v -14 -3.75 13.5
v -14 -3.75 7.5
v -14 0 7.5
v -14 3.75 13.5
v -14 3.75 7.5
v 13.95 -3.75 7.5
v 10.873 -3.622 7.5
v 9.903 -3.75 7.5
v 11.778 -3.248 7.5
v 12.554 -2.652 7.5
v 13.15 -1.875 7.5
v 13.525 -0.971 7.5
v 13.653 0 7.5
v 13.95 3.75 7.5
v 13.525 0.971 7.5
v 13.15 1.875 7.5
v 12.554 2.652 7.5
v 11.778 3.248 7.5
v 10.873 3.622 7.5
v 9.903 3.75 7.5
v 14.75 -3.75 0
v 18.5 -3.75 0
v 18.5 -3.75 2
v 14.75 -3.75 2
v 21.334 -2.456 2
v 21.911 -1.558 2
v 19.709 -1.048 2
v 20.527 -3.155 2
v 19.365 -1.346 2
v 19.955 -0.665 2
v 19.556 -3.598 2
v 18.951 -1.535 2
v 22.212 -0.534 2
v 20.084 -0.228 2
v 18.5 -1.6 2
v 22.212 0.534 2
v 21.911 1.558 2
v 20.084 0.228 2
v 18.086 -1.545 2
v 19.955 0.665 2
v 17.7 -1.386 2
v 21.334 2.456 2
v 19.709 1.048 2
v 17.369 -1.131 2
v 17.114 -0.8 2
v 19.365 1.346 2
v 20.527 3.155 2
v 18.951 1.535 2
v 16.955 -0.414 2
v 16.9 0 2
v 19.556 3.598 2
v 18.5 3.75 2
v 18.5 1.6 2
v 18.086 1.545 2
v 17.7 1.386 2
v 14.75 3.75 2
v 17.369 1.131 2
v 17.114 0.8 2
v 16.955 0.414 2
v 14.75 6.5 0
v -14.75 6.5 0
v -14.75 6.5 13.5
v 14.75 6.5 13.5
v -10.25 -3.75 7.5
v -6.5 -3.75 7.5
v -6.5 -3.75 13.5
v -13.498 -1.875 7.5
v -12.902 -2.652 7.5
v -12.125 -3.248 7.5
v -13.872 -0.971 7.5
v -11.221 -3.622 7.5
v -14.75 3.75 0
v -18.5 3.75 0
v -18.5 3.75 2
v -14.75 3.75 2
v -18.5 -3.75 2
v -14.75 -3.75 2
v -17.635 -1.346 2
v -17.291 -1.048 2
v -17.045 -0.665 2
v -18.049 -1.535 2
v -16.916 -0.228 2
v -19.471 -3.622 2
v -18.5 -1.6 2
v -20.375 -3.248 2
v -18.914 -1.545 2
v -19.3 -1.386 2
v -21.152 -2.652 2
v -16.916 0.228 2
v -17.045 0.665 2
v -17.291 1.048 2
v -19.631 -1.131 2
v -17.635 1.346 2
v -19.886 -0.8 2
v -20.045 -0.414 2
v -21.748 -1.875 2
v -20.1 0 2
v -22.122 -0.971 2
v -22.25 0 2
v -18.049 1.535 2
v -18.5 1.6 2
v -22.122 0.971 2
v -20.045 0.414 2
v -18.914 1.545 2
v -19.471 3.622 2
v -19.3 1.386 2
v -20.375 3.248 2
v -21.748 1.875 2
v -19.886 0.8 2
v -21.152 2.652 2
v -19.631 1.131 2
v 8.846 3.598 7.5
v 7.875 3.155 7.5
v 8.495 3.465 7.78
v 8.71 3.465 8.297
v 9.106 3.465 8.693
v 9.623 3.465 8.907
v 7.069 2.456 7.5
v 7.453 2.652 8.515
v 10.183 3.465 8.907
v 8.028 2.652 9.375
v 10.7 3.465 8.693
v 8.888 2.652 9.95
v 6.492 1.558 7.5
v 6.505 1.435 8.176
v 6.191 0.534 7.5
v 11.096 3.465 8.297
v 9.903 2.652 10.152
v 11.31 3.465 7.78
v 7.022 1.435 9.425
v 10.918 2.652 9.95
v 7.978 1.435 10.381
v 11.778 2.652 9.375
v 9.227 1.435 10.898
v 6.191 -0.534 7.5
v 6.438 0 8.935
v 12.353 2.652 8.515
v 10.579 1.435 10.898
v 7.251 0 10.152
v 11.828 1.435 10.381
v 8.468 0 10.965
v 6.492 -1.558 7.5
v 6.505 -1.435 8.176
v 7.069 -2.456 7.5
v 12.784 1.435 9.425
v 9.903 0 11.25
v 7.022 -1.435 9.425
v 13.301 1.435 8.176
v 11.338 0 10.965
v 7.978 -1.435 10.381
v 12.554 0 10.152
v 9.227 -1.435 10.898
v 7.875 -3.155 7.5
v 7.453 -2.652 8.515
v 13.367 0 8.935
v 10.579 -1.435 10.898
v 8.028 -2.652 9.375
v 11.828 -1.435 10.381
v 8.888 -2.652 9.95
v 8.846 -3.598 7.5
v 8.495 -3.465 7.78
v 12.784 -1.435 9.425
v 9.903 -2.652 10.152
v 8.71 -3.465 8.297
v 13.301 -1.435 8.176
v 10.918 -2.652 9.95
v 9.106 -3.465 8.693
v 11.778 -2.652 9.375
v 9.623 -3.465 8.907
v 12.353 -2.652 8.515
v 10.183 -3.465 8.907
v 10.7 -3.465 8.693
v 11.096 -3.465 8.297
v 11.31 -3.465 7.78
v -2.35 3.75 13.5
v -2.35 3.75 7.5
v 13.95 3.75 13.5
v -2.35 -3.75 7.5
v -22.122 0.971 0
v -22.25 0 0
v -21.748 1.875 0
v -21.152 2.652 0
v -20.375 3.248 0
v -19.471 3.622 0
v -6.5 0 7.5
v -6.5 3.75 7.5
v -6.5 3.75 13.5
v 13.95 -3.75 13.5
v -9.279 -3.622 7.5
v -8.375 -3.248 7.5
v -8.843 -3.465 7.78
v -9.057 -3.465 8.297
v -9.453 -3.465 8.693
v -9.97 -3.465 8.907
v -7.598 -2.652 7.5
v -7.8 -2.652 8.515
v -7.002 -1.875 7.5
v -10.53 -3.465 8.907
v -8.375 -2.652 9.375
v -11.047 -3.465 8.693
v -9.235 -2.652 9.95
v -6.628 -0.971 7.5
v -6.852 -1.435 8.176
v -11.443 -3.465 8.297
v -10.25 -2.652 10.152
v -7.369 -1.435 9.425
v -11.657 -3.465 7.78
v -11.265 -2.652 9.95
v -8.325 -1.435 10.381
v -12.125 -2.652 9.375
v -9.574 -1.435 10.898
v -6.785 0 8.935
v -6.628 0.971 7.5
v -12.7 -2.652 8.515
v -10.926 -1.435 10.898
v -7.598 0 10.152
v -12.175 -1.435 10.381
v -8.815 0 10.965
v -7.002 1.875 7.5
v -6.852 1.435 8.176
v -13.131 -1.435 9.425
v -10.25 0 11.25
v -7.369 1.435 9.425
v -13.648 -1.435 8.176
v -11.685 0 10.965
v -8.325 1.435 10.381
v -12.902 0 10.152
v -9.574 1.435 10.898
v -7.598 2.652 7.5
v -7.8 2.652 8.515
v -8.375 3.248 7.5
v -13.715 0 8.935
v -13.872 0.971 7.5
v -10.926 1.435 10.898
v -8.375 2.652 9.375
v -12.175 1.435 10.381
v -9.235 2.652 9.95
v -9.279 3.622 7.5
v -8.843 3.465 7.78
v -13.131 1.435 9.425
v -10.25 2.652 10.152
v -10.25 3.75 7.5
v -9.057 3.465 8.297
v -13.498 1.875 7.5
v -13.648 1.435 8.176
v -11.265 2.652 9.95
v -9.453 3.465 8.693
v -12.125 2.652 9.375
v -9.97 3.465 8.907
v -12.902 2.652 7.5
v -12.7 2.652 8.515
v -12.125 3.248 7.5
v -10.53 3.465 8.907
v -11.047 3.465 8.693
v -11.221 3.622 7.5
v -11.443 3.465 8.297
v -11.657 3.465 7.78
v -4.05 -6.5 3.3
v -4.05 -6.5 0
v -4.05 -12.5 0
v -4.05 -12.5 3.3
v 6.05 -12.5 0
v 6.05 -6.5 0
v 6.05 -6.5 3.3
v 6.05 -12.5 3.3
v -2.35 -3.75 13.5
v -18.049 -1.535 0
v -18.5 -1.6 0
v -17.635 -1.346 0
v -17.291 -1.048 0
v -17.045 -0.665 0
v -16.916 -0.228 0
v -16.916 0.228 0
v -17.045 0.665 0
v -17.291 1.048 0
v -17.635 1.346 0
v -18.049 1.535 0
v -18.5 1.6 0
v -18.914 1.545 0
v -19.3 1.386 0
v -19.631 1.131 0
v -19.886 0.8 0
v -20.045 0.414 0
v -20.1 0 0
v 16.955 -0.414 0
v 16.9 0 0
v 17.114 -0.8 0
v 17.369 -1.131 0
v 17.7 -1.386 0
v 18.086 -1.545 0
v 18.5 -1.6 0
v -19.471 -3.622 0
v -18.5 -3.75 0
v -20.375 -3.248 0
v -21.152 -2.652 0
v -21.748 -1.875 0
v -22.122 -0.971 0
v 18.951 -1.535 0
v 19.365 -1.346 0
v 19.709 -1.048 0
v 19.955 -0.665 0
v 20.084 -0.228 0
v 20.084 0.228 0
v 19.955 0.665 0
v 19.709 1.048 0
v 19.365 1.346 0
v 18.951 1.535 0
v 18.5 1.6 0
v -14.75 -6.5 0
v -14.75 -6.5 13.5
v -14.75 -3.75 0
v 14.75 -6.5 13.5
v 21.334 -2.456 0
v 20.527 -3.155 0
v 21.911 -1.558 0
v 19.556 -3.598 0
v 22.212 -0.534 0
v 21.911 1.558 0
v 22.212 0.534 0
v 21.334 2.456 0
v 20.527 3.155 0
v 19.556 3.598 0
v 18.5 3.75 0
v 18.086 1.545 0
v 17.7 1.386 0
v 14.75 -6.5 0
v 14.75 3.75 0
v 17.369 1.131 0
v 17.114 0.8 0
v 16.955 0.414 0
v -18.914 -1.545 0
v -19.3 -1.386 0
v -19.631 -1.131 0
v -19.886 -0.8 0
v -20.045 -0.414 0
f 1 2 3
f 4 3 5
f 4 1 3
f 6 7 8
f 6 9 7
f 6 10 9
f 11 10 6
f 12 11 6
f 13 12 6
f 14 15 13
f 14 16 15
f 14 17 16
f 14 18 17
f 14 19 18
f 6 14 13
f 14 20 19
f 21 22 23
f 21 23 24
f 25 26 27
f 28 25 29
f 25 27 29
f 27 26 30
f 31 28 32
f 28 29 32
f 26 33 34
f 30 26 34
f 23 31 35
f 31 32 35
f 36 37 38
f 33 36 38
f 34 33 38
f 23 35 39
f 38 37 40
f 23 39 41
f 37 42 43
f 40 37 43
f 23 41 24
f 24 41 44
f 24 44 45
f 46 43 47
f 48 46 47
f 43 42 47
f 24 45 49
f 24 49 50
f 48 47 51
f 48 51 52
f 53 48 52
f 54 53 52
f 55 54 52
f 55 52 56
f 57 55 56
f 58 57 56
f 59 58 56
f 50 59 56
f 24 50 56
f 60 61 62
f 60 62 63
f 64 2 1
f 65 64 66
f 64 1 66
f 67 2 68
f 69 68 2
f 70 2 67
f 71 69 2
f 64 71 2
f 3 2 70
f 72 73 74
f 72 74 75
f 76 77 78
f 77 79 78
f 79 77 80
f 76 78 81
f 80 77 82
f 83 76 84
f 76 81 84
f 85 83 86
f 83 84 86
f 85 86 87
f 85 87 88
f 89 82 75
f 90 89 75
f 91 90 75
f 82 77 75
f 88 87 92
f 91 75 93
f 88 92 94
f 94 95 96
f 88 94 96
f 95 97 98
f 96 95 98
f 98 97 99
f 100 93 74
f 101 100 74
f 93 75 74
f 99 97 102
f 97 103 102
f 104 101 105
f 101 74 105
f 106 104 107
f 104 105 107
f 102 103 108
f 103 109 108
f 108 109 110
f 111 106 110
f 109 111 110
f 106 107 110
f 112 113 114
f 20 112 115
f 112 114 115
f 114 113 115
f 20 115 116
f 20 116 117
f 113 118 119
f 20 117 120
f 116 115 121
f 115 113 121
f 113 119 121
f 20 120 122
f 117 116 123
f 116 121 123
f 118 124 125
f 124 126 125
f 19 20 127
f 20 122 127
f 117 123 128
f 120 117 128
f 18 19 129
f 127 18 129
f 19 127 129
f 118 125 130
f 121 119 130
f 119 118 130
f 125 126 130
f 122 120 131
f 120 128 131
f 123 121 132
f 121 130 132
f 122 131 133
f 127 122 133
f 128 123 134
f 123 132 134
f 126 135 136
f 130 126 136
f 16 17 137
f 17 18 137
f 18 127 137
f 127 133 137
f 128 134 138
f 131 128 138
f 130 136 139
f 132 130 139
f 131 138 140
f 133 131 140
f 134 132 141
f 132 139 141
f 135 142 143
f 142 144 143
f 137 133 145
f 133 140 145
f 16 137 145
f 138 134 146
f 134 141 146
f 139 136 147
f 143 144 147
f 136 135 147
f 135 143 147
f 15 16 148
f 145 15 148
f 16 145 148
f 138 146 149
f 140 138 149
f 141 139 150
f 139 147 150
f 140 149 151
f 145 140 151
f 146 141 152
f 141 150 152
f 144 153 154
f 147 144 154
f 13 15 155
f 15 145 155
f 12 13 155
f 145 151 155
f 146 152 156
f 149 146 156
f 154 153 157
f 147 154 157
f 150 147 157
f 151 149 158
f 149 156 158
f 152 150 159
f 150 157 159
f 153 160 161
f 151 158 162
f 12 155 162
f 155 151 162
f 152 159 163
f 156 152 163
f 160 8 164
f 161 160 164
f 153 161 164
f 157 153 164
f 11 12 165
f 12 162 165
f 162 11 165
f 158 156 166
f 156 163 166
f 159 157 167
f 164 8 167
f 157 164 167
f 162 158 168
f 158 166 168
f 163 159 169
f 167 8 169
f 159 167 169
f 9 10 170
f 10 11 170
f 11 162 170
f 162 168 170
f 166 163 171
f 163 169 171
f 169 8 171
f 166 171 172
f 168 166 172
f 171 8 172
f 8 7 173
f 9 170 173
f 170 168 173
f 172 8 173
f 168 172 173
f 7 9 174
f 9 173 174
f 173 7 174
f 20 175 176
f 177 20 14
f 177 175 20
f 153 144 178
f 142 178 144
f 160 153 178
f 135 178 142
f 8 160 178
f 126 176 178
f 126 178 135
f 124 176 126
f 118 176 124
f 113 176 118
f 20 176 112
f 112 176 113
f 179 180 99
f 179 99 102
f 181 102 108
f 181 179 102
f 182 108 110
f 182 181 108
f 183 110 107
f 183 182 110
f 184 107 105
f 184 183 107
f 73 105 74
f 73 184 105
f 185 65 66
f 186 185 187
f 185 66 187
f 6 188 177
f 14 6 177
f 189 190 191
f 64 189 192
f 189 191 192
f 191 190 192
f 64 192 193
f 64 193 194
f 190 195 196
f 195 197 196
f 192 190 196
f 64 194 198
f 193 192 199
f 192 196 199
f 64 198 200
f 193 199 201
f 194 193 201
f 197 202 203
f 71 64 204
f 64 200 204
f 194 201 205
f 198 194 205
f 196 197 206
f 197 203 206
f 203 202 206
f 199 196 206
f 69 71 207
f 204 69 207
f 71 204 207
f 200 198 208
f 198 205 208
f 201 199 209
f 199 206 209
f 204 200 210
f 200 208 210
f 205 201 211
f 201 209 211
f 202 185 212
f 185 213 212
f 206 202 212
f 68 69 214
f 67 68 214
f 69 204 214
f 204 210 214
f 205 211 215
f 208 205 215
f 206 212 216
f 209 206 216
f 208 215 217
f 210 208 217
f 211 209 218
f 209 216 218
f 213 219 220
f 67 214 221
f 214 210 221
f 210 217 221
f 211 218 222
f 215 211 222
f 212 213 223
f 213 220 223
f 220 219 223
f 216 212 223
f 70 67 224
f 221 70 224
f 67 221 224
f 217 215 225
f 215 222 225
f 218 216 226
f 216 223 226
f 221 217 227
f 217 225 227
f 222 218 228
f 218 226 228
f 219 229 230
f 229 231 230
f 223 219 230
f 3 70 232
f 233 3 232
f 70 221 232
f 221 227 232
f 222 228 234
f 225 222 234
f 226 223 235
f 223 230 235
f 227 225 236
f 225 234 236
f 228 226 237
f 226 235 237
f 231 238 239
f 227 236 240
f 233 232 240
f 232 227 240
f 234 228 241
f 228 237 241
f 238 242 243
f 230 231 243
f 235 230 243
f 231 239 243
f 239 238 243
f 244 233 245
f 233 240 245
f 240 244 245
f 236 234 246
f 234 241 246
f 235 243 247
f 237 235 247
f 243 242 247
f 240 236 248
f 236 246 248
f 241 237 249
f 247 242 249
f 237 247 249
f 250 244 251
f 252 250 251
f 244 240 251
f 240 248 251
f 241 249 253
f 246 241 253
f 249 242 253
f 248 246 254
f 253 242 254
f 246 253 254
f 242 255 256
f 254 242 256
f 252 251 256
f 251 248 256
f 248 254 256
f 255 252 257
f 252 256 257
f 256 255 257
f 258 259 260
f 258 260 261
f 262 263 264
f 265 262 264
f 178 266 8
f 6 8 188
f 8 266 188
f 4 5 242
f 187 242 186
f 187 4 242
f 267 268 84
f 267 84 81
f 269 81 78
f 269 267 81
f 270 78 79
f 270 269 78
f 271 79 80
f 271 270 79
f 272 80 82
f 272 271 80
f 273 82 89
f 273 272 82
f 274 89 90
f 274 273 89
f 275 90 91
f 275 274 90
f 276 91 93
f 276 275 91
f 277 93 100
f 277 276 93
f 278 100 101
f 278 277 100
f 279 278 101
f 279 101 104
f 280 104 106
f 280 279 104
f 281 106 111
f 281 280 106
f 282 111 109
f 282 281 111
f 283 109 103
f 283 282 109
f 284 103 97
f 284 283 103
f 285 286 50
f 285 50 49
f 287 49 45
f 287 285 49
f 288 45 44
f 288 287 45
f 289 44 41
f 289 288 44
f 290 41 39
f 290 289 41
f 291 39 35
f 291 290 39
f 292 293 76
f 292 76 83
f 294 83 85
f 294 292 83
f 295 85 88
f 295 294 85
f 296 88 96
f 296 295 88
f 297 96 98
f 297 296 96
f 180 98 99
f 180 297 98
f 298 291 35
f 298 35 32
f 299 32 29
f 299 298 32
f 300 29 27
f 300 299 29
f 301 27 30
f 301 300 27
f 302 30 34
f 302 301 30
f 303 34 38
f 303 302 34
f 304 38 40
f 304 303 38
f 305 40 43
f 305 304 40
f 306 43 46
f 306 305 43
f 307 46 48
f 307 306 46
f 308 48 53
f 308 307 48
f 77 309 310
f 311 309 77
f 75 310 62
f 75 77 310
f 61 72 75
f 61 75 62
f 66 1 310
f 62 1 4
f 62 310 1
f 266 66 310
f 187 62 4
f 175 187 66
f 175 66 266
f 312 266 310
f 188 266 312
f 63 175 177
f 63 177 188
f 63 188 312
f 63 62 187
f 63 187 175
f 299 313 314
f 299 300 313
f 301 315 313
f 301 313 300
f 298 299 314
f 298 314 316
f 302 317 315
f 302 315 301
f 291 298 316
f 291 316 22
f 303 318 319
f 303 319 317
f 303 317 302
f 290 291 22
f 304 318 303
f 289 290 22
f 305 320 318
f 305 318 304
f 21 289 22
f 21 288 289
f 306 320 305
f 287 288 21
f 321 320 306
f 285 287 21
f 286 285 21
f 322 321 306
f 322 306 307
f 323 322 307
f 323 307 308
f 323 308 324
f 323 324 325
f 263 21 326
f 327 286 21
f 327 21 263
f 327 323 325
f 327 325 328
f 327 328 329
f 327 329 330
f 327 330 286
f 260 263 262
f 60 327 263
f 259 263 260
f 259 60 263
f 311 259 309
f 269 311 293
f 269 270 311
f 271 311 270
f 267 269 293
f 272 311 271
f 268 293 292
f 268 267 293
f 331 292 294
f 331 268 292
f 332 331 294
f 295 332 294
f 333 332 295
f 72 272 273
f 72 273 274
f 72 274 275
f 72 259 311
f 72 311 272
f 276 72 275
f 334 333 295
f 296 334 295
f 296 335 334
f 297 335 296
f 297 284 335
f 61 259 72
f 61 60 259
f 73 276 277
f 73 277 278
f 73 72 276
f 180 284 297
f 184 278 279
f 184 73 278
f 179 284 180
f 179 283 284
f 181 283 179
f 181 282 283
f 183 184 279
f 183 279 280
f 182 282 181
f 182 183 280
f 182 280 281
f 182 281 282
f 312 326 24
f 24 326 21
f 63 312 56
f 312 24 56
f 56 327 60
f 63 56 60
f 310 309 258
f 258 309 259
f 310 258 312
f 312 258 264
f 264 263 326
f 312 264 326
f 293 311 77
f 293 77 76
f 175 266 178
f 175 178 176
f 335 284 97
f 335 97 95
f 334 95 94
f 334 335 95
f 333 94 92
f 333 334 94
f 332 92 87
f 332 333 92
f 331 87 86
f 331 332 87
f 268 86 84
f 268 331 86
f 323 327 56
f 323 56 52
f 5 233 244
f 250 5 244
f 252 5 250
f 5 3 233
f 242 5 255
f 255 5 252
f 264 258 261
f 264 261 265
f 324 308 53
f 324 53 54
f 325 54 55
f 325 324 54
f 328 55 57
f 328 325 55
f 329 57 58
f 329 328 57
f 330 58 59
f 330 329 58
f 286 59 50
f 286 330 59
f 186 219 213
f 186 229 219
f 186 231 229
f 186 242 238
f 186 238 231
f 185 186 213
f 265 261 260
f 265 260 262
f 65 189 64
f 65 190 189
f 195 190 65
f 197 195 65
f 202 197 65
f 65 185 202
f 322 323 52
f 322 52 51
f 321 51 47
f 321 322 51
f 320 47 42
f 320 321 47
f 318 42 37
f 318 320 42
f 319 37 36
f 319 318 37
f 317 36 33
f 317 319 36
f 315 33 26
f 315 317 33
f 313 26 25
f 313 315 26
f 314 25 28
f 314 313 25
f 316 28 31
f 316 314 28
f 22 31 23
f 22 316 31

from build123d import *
from build123d.topology import SkipClean

# Parameters (mm, degrees)
SKETCH_1_W          = 29.5
SKETCH_1_H          = 13
EXTRUDE_1_DEPTH     = 13.5
SKETCH_2_R          = 1.6
EXTRUDE_2_DEPTH     = 2
SKETCH_3_W          = 7.5
SKETCH_3_H          = 7.5
SKETCH_3_W_2        = 16.3
CUT_EXTRUDE_1_DEPTH = 6
SKETCH_7_W          = 10.1
SKETCH_7_H          = 3.3
EXTRUDE_3_DEPTH     = 6


with BuildPart() as part:
    # 스케치1 → 보스-돌출1 (new body)
    with BuildSketch(Plane.XY):
        Rectangle(SKETCH_1_W, SKETCH_1_H)
    extrude(amount=EXTRUDE_1_DEPTH)

    # 스케치2 → 보스-돌출2 (add)
    with BuildSketch(Plane(origin=(0, 0, 0), x_dir=(-1, 0, 0), z_dir=(0, 0, -1))):
        with BuildLine():
            Line((-18.5, -3.75), (18.5, -3.75))
            ThreePointArc((18.5, -3.75), (22.25, 0), (18.5, 3.75))
            Line((18.5, 3.75), (-18.5, 3.75))
            ThreePointArc((-18.5, 3.75), (-22.25, 0), (-18.5, -3.75))
        make_face()
        with Locations((-18.5, 0)):
            Circle(SKETCH_2_R, mode=Mode.SUBTRACT)
        with Locations((18.5, 0)):
            Circle(SKETCH_2_R, mode=Mode.SUBTRACT)
    extrude(amount=-EXTRUDE_2_DEPTH)

    # 스케치3 → 컷-돌출1 (cut)
    with BuildSketch(Plane.XY.offset(13.5)):
        with Locations((-10.25, 0)):
            Rectangle(SKETCH_3_W, SKETCH_3_H)
        with Locations((5.8, 0)):
            Rectangle(SKETCH_3_W_2, SKETCH_3_H)
    extrude(amount=-CUT_EXTRUDE_1_DEPTH, mode=Mode.SUBTRACT)

    # 스케치4 → 회전1 (revolve)
    with BuildSketch(Plane.XY.offset(7.5)):
        with BuildLine():
            Line((-10.25, -3.75), (-10.25, 3.75))
            ThreePointArc((-10.25, 3.75), (-14, 0), (-10.25, -3.75))
        make_face()
    revolve(axis=Axis((-10.25, 3.75, 7.5), (0, -1, 0)))

    # 스케치6 → 회전14 (revolve)
    with SkipClean():  # the faces are left unmerged after this step: merging them gives an invalid solid
        with BuildSketch(Plane.XY.offset(7.5)):
            with BuildLine():
                Line((9.902834279, 3.75), (9.902834279, -3.75))
                ThreePointArc((9.902834279, -3.75), (12.554484709, -2.651650429), (13.652834279, 0))
                ThreePointArc((13.652834279, 0), (12.554484709, 2.651650429), (9.902834279, 3.75))
            make_face()
        revolve(axis=Axis((9.902834279, -3.75, 7.5), (0, 1, 0)))

    # 스케치7 → 보스-돌출3 (add)
    with SkipClean():  # the faces are left unmerged after this step: merging them gives an invalid solid
        with BuildSketch(Plane.XZ.offset(6.5)):
            with Locations((1, 1.65)):
                Rectangle(SKETCH_7_W, SKETCH_7_H)
        extrude(amount=EXTRUDE_3_DEPTH)


solid = part.part
